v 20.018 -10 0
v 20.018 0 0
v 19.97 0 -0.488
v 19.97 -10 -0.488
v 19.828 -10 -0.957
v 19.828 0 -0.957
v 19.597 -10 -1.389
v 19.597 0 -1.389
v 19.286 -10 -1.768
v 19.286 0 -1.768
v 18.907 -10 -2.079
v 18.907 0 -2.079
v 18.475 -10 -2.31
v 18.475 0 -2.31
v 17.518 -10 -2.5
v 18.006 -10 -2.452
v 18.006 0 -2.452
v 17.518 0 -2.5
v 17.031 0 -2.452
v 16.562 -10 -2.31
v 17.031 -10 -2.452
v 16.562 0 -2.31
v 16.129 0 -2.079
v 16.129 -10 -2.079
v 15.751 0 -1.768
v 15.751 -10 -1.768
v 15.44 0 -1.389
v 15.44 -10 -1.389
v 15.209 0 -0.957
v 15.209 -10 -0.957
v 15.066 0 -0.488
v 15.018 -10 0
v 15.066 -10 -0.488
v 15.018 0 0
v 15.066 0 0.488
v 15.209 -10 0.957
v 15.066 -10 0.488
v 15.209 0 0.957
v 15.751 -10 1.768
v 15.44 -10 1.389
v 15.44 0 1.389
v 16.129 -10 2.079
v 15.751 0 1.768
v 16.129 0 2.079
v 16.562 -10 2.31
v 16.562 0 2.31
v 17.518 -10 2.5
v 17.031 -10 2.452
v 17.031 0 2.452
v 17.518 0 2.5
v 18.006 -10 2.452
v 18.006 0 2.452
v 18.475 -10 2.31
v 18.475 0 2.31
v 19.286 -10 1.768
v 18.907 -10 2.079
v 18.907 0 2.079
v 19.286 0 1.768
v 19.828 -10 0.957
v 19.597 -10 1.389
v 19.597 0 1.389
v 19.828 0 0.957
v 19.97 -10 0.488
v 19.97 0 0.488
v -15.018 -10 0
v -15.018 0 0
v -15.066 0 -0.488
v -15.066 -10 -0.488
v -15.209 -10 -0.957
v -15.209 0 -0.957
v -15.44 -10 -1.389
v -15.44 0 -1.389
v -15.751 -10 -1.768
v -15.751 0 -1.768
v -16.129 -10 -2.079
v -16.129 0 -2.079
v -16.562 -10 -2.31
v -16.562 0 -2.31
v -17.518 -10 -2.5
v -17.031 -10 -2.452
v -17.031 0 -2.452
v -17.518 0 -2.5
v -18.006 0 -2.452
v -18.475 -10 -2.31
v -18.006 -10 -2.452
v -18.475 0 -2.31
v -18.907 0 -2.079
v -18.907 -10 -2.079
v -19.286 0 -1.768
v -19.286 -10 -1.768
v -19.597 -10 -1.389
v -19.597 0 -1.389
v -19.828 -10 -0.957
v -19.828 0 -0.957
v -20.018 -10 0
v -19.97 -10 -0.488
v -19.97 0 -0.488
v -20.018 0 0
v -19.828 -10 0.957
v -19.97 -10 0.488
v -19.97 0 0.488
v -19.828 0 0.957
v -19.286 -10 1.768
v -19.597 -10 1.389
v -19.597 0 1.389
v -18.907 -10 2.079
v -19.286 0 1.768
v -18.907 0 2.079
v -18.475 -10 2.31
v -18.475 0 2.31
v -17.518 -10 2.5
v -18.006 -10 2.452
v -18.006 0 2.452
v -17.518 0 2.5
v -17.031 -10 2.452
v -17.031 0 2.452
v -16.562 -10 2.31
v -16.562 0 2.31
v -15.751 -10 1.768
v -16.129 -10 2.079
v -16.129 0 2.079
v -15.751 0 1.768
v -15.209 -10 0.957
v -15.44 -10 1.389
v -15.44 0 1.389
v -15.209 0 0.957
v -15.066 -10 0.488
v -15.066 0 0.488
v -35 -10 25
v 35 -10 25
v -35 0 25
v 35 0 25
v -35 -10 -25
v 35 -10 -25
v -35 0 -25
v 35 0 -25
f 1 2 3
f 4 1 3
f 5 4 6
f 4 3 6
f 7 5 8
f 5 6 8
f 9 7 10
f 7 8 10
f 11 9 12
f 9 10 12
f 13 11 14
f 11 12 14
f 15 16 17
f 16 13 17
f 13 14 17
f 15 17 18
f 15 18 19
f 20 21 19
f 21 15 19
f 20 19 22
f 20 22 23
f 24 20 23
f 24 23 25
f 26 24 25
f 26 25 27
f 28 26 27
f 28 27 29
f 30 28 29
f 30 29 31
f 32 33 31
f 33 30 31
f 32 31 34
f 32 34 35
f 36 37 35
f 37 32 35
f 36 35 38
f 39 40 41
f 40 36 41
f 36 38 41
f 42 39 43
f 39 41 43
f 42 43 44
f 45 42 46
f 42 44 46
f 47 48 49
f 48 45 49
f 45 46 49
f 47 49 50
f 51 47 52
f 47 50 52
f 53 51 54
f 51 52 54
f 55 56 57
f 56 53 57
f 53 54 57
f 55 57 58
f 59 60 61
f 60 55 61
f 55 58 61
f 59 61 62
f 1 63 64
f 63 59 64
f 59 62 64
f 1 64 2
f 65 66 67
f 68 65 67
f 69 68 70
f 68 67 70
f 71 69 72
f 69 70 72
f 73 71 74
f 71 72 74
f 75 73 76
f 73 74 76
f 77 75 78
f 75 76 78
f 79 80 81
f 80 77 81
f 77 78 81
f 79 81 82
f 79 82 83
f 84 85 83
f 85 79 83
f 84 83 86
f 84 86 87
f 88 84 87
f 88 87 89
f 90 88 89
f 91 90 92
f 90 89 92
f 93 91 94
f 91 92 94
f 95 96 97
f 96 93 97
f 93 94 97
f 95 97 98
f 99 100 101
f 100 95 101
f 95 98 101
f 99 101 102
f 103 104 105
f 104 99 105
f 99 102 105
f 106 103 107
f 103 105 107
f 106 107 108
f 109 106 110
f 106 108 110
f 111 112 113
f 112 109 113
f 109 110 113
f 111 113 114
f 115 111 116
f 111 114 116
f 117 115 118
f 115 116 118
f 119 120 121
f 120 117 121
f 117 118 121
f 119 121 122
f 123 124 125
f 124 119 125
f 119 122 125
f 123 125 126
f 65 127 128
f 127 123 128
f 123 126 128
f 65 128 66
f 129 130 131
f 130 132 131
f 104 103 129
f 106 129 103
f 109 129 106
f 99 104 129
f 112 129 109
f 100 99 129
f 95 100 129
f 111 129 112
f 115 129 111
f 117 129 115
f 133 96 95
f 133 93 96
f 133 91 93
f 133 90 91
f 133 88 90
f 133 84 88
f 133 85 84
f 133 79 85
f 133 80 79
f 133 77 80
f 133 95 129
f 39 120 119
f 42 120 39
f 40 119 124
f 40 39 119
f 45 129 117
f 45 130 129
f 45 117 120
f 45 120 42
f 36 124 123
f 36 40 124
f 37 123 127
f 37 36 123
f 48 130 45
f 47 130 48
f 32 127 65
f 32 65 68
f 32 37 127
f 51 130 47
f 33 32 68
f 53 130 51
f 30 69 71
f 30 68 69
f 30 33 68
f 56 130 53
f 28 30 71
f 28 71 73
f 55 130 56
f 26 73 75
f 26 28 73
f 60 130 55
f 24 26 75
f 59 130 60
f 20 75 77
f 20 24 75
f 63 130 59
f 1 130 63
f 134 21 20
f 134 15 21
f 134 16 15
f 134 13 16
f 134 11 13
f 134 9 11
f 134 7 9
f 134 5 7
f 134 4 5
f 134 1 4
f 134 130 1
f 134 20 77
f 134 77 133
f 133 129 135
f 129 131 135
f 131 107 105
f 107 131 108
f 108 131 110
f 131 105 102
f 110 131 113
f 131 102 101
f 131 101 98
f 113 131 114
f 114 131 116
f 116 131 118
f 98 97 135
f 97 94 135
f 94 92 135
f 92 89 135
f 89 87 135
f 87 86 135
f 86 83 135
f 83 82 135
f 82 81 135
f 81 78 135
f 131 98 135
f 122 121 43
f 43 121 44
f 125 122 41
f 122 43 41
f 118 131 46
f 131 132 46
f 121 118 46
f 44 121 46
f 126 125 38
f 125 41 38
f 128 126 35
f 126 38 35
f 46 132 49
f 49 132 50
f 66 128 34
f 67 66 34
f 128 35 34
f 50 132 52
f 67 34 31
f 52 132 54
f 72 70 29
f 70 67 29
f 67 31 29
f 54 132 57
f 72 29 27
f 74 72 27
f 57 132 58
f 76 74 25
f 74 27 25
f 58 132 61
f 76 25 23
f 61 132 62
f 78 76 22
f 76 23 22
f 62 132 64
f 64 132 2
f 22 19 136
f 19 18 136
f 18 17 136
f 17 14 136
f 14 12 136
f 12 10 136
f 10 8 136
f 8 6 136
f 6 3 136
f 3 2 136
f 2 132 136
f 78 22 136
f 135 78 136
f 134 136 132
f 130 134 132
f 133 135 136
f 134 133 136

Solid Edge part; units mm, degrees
sketch "Sketch1" plane through (0, 0, 0) normal (0, -1, 0) x (1, 0, 0)
  line L0 (35, 25) -> (-35, 25)
  line L1 (-35, 25) -> (-35, -25)
  line L2 (-35, -25) -> (35, -25)
  line L3 (35, -25) -> (35, 25)
extrude "Protrusion1" add sketch "Sketch1" along normal blind 10
sketch "Sketch2" plane through (0, 0, 0) normal (0, -1, 0) x (1, 0, 0)
  circle A0 centre (-17.5183, 0) radius 2.5
extrude "ExtrudedCutout_3" cut sketch "Sketch2" along normal blind 10
sketch "Sketch3" plane through (0, 0, 0) normal (0, -1, 0) x (1, 0, 0)
  circle A0 centre (17.5183, 0) radius 2.5
extrude "ExtrudedCutout_4" cut sketch "Sketch3" along normal blind 10
